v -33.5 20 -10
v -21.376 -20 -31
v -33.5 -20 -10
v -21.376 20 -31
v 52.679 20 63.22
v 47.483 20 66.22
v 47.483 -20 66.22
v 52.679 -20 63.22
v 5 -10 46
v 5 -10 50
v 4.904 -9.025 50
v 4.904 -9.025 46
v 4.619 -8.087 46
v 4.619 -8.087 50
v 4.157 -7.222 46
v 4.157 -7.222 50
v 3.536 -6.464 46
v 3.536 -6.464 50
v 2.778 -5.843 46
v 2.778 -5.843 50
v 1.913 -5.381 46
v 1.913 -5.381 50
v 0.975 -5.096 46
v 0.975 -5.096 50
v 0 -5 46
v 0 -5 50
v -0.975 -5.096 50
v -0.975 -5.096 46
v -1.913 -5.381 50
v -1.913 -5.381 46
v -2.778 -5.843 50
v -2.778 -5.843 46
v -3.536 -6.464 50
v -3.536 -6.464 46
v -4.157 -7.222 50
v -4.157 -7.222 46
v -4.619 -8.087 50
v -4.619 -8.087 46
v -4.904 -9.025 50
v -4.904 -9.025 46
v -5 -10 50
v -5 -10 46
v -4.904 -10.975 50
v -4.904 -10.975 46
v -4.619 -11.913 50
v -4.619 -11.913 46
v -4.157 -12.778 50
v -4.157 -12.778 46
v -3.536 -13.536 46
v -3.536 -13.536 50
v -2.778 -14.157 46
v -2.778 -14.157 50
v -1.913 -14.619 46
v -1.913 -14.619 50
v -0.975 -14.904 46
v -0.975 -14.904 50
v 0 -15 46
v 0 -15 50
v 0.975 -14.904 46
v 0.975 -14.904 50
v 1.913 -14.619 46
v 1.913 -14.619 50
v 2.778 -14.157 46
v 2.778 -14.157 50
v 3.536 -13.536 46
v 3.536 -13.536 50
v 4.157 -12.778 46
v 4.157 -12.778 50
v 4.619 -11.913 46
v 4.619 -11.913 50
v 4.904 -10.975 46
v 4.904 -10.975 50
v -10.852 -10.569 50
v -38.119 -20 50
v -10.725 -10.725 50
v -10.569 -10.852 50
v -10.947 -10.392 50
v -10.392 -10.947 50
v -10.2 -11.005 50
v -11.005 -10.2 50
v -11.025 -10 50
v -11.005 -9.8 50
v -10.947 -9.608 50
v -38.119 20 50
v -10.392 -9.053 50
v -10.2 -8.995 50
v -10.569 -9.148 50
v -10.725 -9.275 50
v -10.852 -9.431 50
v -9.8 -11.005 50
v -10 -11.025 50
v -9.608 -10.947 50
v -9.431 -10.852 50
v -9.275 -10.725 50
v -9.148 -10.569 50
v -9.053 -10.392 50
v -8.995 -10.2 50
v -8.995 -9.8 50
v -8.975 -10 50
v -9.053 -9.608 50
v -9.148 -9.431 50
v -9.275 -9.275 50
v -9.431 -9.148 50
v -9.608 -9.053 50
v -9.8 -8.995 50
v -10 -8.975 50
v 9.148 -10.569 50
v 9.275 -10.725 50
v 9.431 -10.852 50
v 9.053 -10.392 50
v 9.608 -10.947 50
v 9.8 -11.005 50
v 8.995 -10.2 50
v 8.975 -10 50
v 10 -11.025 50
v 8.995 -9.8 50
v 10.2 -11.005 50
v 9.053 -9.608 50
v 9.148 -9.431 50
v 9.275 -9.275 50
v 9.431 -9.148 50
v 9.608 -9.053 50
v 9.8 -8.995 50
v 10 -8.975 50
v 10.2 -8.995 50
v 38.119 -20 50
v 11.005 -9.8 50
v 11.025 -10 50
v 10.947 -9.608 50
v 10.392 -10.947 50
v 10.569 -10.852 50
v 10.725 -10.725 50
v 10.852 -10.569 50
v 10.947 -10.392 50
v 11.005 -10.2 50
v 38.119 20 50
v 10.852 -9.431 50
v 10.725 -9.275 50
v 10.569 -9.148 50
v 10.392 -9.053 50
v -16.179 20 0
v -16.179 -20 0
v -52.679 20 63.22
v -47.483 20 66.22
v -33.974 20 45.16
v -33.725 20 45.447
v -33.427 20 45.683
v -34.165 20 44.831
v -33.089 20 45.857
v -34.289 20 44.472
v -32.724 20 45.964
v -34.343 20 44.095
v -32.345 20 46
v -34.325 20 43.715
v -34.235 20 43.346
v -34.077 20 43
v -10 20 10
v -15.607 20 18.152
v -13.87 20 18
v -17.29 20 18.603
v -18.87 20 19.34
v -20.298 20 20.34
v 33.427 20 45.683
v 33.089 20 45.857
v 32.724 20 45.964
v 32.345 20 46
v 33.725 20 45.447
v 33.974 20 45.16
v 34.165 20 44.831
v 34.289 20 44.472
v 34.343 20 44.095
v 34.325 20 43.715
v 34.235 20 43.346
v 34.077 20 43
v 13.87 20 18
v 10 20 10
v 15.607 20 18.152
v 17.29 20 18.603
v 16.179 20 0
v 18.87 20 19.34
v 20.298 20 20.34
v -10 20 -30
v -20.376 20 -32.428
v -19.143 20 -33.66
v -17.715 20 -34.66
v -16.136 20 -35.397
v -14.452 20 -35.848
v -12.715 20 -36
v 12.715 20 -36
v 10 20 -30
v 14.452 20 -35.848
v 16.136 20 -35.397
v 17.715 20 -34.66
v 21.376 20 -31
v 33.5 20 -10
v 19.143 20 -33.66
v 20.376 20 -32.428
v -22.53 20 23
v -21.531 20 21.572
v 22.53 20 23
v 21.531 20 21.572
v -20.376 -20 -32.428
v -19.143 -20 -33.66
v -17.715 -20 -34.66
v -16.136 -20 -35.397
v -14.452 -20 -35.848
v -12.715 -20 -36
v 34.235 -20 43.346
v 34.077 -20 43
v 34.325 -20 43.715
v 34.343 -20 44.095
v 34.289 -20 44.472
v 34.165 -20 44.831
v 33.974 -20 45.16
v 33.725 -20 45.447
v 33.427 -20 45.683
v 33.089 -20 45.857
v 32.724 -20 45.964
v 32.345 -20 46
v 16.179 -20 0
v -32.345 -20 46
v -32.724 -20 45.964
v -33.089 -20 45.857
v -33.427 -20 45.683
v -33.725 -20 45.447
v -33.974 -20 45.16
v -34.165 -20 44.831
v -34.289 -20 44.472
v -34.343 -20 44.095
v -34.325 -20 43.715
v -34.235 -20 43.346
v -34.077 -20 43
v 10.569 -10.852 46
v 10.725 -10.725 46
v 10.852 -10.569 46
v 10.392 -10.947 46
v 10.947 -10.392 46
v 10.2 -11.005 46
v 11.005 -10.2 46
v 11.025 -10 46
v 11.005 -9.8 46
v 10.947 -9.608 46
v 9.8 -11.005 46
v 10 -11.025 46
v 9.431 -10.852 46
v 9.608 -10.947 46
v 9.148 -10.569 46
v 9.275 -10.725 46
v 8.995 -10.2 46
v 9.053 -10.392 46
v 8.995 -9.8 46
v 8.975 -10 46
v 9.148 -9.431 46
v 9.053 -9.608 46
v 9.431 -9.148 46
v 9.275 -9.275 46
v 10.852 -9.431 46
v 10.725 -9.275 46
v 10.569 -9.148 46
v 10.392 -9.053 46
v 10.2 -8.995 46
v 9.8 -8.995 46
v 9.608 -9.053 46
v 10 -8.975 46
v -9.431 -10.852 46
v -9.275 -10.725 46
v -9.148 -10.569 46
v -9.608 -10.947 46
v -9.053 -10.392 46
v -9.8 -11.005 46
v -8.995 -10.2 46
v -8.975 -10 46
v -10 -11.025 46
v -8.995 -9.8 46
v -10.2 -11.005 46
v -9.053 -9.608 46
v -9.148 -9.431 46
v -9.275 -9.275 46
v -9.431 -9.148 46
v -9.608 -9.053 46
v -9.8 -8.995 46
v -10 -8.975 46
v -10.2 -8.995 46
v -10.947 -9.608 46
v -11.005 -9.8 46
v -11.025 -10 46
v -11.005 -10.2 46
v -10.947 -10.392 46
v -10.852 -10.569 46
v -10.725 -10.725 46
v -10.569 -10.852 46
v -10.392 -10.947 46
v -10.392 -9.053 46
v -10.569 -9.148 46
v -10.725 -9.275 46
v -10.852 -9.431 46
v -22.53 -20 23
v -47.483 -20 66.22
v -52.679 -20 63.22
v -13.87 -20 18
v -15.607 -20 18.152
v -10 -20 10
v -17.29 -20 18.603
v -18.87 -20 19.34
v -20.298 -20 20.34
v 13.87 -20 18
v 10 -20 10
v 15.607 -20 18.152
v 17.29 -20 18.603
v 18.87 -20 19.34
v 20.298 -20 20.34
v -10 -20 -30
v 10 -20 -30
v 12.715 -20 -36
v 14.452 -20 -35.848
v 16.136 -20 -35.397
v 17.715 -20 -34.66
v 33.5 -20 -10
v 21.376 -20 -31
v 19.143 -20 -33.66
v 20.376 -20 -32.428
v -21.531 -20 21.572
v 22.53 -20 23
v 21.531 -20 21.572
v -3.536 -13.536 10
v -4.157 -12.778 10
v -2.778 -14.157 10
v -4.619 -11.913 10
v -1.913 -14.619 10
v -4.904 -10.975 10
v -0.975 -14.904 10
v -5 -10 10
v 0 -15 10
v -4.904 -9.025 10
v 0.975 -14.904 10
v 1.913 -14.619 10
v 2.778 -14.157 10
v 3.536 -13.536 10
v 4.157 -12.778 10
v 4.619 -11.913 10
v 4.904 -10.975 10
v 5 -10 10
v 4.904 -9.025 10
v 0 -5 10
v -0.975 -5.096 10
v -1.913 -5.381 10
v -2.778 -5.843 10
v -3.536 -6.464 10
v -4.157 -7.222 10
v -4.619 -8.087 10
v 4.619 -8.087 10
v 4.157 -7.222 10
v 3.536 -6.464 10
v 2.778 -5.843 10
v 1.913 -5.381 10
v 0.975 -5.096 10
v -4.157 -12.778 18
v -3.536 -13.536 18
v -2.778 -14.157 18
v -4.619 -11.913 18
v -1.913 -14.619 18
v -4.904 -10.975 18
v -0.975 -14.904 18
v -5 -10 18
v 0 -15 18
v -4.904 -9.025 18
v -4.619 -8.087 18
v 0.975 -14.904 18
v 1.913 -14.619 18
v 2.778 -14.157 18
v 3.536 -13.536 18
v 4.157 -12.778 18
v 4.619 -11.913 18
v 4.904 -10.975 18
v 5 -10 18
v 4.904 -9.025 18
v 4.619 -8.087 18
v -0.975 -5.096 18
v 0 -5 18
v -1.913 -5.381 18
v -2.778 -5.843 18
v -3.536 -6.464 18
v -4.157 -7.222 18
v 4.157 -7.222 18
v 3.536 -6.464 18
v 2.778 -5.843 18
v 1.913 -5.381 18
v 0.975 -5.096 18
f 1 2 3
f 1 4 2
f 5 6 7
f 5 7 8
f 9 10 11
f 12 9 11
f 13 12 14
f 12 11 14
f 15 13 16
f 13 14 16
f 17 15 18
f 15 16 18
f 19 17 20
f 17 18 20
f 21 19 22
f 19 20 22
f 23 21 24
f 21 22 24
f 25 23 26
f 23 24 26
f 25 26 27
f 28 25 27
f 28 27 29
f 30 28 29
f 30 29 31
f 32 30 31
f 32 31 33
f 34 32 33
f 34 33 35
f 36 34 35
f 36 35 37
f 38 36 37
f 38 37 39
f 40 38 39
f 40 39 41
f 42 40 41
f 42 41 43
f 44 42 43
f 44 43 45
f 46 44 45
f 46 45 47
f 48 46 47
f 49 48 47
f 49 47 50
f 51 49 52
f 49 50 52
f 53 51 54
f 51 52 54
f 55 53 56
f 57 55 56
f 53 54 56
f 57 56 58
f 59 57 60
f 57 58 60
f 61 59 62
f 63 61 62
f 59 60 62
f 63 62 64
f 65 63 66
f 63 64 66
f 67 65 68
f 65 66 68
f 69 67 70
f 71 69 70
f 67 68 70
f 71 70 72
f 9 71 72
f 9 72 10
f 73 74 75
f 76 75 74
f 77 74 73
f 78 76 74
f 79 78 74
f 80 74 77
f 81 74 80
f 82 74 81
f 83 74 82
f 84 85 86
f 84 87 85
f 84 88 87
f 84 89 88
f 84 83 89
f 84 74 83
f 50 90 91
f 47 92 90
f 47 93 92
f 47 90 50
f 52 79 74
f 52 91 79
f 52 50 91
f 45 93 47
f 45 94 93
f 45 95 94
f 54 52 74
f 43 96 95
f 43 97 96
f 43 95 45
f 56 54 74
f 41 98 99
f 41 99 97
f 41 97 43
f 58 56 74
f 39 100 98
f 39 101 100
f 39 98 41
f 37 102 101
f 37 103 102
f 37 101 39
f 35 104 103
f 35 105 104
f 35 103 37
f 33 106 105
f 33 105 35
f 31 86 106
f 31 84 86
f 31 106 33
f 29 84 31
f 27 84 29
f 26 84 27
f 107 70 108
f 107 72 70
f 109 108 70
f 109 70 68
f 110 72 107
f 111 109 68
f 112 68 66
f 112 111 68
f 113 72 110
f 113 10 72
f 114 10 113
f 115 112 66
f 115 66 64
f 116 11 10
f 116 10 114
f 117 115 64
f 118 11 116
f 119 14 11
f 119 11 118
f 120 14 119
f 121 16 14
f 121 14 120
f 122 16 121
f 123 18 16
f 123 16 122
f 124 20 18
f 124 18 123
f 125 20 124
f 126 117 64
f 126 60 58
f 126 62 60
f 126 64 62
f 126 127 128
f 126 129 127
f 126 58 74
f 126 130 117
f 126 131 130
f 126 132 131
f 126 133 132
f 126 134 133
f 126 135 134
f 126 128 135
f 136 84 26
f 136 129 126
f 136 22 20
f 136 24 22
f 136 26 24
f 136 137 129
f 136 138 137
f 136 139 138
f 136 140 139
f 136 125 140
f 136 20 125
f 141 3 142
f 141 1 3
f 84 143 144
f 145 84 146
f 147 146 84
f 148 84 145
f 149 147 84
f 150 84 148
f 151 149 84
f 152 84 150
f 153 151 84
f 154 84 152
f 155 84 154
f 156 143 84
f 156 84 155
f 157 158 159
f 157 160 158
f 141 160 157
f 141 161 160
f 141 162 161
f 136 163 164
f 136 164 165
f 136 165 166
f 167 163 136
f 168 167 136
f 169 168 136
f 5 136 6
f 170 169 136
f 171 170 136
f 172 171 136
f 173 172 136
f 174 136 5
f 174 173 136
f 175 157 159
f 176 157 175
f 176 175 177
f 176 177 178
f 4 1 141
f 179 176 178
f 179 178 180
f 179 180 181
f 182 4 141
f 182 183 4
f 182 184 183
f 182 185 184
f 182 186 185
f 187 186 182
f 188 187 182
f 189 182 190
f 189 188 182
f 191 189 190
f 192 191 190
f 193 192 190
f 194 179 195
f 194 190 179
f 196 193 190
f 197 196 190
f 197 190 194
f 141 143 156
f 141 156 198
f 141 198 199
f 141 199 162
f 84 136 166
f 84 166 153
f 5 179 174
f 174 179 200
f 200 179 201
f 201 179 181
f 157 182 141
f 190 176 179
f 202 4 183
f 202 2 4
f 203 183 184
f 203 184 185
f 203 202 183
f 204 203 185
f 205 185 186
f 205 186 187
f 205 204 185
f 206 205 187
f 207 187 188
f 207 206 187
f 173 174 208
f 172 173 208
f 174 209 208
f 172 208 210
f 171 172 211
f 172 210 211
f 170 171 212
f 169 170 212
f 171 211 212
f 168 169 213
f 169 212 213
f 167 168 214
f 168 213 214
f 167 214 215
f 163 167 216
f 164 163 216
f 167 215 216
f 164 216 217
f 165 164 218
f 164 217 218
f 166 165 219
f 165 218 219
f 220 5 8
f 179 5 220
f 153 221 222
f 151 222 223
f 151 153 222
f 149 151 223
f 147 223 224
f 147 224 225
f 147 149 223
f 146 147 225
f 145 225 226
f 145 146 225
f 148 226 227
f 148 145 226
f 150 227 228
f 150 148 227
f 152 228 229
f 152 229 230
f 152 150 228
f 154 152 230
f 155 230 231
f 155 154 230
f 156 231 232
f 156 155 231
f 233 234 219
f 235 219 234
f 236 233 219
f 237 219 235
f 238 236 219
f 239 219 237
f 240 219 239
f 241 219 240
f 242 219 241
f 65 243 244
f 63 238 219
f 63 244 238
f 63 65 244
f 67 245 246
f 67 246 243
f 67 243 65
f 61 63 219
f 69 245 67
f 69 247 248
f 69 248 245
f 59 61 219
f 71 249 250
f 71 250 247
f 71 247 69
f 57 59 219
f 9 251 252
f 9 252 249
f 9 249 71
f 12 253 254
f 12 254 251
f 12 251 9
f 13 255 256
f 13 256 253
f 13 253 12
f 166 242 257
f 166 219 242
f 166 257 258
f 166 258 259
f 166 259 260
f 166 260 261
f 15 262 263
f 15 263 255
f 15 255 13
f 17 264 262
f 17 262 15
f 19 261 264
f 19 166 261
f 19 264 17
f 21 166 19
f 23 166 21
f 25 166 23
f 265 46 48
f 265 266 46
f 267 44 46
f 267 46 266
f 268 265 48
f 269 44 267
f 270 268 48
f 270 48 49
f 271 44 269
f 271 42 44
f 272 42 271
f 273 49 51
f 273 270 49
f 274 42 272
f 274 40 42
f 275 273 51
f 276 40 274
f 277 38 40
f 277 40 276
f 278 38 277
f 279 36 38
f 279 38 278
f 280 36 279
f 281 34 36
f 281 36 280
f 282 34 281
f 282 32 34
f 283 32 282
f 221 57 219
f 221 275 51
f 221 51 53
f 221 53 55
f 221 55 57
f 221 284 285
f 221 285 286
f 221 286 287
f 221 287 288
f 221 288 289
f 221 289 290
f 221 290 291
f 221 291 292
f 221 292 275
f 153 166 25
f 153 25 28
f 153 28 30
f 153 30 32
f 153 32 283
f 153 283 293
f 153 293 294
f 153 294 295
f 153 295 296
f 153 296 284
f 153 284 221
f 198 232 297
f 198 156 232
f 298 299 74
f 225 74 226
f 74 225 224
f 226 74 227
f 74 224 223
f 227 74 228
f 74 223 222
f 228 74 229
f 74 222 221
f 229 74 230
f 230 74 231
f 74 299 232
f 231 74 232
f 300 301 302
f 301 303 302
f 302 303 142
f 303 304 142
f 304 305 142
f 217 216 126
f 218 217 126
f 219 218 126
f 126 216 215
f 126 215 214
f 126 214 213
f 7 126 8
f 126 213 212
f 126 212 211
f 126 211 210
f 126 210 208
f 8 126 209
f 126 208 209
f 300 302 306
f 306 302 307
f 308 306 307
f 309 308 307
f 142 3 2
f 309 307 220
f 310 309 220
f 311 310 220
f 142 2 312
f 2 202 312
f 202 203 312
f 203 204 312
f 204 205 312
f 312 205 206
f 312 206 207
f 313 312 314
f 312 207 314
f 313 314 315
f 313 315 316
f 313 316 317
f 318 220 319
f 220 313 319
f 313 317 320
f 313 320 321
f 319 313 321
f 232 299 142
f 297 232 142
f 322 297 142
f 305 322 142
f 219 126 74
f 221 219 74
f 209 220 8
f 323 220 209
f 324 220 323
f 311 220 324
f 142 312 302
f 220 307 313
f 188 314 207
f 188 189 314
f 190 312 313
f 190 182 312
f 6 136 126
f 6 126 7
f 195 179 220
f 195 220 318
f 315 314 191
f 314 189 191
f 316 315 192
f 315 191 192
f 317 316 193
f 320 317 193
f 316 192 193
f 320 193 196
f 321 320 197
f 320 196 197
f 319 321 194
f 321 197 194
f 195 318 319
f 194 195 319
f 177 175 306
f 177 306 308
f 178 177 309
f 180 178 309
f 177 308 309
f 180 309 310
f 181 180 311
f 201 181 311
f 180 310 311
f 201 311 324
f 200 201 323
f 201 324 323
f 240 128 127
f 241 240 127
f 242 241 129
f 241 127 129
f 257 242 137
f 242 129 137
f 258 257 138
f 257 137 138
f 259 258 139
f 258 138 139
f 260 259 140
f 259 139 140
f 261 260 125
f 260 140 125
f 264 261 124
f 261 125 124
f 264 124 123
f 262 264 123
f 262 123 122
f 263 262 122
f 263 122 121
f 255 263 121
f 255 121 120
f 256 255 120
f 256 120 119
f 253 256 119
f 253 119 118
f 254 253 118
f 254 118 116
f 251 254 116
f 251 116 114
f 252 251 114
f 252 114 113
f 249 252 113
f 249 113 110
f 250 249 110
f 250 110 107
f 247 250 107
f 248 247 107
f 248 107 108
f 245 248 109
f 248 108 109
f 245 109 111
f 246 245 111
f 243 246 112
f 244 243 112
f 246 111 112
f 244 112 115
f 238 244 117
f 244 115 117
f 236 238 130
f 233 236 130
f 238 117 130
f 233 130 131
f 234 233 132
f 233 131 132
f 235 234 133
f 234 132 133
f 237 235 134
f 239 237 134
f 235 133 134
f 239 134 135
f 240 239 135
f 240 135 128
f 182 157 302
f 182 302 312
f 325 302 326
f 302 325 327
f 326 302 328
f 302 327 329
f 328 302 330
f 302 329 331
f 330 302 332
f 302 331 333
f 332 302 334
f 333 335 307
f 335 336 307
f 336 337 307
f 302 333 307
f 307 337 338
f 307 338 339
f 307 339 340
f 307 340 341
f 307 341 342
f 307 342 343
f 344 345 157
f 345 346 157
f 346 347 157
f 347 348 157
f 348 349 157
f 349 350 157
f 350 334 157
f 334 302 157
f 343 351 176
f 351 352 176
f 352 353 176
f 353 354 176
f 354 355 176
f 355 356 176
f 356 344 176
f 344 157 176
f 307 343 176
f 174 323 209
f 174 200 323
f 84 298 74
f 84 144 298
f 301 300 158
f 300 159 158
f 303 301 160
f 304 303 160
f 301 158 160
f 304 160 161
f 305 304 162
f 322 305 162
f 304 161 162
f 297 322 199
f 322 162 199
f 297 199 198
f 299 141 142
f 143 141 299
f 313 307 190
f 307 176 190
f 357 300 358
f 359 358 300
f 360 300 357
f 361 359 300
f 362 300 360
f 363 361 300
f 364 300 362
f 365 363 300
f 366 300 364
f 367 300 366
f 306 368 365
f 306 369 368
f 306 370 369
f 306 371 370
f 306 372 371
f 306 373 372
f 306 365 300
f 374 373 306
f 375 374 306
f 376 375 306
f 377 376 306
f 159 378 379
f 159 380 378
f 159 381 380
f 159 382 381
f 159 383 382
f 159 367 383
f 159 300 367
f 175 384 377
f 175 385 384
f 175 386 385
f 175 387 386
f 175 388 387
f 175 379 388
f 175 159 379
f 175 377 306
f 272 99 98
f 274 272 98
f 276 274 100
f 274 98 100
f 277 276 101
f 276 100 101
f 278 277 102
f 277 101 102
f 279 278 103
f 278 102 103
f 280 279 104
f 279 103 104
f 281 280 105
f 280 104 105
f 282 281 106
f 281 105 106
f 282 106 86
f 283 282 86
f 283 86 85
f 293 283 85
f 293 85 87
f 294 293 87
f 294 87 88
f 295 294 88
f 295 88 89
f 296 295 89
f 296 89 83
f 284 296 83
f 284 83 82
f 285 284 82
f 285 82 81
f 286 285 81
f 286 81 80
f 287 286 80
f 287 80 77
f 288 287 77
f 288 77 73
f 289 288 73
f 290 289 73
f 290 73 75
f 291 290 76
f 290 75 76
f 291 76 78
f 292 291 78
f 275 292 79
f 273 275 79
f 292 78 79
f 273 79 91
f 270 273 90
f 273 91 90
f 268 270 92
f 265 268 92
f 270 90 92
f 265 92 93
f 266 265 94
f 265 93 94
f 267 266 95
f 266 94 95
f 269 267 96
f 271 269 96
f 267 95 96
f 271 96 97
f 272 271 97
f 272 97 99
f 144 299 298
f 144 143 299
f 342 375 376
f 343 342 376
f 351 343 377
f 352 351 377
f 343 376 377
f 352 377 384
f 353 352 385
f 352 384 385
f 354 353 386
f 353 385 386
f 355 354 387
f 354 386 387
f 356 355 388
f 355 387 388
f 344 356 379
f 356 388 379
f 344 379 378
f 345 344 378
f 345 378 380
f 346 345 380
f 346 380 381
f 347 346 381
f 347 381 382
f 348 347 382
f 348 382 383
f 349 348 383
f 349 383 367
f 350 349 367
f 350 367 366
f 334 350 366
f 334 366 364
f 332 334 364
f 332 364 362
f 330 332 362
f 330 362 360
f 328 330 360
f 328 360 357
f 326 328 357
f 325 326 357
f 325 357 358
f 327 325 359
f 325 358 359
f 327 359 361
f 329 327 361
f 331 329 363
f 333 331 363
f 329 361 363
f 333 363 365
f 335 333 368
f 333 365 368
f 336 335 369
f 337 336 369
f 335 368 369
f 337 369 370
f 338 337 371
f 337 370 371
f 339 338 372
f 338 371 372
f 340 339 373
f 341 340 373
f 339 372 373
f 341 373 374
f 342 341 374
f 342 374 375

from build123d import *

# Parameters (mm, degrees)
SKETCH_1_W              = 20
SKETCH_1_H              = 40
EXTRUDE_763_DEPTH       = 20
FILLET_1_R              = 10
FILLET_2_R              = 2
CUT_EXTRUDE_1402_REACH  = 104.816
SKETCH_2_R              = 5
HOLE_WIZARD_M2_5_REACH  = 104.816
HOLE_WIZARD_M2_5_BORE_R = 1.025


with BuildPart() as part:
    # Эскиз1 → Extrude 763 (new, symmetric)
    with BuildSketch(Plane(origin=(0, 0, 0), x_dir=(1, 0, 0), z_dir=(0, 1, 0))):
        Polygon((-38.118802154, -50), (38.118802154, -50), (47.483339502, -66.219854476), (52.679491924, -63.219854476), (16.179491924, 0), (33.5, 10), (18.488893001, 36), (-18.488893001, 36), (-33.5, 10), (-16.179491924, 0), (-52.679491924, -63.219854476), (-47.483339502, -66.219854476), align=None)
        Polygon((-35.809401077, -46), (-19.643593539, -18), (19.643593539, -18), (35.809401077, -46), align=None, mode=Mode.SUBTRACT)
        with Locations((0, 10)):
            Rectangle(SKETCH_1_W, SKETCH_1_H, mode=Mode.SUBTRACT)
    extrude(amount=EXTRUDE_763_DEPTH, both=True)

    # Скругление1
    fillet_1_edges = [part.edges().sort_by_distance(p)[0] for p in [
        (-18.488893001, 0, -36),
        (18.488893001, 0, -36),
        (19.643593539, 0, 18),
        (-19.643593539, 0, 18),
    ]]
    fillet(fillet_1_edges, radius=FILLET_1_R)

    # Скругление2
    fillet_2_edges = [part.edges().sort_by_distance(p)[0] for p in [
        (35.809401077, 0, 46),
        (-35.809401077, 0, 46),
    ]]
    fillet(fillet_2_edges, radius=FILLET_2_R)

    # Cut-Extrude 1402: up to this face of the body (flat: up to its plane)
    cut_extrude_1402_end = Plane(part.part.faces().sort_by_distance((0, 0, 10))[0])
    # Эскиз2 → Cut-Extrude 1402 (cut, up to the picked face)
    with BuildSketch(Plane.XY.offset(50), mode=Mode.PRIVATE) as cut_extrude_1402_sk1:
        with Locations((0, -10)):
            Circle(SKETCH_2_R)
    cut_extrude_1402_tool1 = split(extrude(cut_extrude_1402_sk1.sketch, amount=-CUT_EXTRUDE_1402_REACH, mode=Mode.PRIVATE), bisect_by=cut_extrude_1402_end, keep=Keep.BOTH, mode=Mode.PRIVATE)
    add(cut_extrude_1402_tool1.solids().sort_by(Axis((0, -10, 50), (0, 0, -1)))[0], mode=Mode.SUBTRACT)

    # Заглушка подшипника M2.5 bore → Заглушка подшипника M2.5 (cut, up to next)
    with BuildSketch(Plane.XY.offset(50), mode=Mode.PRIVATE) as hole_wizard_m2_5_sk1:
        with Locations((-10, -10)):
            Circle(HOLE_WIZARD_M2_5_BORE_R)
    hole_wizard_m2_5_tool1 = extrude(hole_wizard_m2_5_sk1.sketch, amount=-HOLE_WIZARD_M2_5_REACH, mode=Mode.PRIVATE) & part.part
    # Заглушка подшипника M2.5 bore → Заглушка подшипника M2.5 (cut, up to next)
    with BuildSketch(Plane.XY.offset(50), mode=Mode.PRIVATE) as hole_wizard_m2_5_sk2:
        with Locations((10, -10)):
            Circle(HOLE_WIZARD_M2_5_BORE_R)
    hole_wizard_m2_5_tool2 = extrude(hole_wizard_m2_5_sk2.sketch, amount=-HOLE_WIZARD_M2_5_REACH, mode=Mode.PRIVATE) & part.part
    add(hole_wizard_m2_5_tool1.solids().sort_by_distance((-10, -10, 50))[0], mode=Mode.SUBTRACT)
    add(hole_wizard_m2_5_tool2.solids().sort_by_distance((10, -10, 50))[0], mode=Mode.SUBTRACT)


solid = part.part
